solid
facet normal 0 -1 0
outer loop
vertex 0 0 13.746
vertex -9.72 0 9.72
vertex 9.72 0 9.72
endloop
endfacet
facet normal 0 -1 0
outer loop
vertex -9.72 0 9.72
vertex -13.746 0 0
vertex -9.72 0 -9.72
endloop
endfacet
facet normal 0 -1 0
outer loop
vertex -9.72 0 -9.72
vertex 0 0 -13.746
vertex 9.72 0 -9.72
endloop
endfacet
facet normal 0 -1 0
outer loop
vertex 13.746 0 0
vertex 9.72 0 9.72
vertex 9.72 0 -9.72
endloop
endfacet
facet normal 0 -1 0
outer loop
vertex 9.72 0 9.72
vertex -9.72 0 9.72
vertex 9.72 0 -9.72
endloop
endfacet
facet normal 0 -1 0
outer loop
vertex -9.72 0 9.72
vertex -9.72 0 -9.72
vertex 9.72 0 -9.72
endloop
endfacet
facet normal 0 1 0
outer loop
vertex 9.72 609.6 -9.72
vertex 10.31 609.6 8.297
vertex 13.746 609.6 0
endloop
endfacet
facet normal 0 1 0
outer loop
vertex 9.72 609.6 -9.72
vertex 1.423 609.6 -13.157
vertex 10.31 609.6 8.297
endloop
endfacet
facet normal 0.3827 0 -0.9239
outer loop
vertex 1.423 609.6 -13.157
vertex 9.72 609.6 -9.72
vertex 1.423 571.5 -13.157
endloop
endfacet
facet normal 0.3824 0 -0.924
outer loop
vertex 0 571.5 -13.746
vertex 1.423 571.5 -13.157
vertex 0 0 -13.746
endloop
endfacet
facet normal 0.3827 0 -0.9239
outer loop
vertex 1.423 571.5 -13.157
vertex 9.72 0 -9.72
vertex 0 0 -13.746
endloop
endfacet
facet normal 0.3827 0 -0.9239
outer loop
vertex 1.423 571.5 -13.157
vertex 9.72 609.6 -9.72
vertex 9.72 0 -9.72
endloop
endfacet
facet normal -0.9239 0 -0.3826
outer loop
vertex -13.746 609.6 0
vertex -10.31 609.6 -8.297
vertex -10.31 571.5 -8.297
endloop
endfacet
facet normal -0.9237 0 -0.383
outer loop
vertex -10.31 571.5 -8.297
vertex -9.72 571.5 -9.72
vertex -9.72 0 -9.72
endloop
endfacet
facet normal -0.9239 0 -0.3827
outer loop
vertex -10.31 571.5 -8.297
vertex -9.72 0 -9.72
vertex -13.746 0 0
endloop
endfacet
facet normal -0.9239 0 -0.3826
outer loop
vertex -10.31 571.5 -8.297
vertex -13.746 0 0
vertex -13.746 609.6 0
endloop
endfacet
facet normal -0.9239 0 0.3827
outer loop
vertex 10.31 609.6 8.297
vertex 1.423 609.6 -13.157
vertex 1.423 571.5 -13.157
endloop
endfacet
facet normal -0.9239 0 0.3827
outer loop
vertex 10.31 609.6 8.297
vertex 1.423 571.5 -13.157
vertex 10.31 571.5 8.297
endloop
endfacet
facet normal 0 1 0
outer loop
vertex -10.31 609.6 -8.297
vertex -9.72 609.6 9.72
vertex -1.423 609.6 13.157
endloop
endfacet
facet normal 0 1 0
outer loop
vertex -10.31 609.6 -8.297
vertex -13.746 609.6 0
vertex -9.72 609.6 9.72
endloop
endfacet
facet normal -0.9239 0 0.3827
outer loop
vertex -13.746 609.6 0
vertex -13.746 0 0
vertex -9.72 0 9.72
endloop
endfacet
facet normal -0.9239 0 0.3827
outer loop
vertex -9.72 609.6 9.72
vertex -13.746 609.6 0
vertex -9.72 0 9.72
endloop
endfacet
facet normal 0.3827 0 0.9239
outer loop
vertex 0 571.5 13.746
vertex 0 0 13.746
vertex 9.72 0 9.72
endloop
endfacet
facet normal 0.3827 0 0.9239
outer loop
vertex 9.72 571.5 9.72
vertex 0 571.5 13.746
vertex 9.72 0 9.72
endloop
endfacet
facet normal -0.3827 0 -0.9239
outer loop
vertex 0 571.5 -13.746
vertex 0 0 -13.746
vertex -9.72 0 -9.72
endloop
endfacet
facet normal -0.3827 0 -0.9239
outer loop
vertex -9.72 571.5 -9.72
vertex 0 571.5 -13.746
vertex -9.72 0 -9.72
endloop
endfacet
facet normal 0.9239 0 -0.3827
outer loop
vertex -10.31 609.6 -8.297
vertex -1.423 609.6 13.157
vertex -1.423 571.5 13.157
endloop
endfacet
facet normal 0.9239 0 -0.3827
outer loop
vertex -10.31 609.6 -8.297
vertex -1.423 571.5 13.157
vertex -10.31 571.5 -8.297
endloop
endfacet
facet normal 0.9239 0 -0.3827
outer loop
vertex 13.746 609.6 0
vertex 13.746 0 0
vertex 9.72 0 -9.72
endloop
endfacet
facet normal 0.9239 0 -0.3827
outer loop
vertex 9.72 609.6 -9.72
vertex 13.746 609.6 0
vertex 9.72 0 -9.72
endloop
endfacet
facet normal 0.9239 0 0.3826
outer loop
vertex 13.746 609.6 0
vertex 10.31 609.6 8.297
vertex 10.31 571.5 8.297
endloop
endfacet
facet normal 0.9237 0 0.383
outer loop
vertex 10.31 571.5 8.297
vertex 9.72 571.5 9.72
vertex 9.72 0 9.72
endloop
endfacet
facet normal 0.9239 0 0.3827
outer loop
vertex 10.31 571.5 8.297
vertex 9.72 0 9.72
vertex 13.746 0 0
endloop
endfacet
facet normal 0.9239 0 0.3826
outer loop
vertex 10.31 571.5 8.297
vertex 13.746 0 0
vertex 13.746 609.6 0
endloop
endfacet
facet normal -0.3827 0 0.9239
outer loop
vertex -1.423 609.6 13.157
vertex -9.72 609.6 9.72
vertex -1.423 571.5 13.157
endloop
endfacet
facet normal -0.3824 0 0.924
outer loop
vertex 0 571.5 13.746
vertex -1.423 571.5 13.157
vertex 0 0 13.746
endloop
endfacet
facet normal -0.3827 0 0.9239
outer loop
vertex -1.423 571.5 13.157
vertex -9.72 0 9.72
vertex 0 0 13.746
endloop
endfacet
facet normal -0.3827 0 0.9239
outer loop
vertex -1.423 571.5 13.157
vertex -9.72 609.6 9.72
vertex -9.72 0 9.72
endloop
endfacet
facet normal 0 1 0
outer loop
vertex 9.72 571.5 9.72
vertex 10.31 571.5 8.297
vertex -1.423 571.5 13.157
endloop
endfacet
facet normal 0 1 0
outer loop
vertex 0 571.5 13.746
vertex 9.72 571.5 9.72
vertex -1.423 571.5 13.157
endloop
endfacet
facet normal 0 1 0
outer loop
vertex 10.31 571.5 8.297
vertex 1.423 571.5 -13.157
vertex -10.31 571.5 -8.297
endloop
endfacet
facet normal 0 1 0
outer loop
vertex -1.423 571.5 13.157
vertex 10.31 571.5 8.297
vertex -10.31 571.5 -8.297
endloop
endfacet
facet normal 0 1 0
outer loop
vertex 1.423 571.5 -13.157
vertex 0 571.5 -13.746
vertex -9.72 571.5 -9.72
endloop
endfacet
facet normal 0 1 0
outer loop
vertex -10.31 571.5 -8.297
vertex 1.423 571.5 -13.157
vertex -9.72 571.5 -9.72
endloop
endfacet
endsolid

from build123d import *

# Parameters (mm, degrees)
BOSS_EXTRUDE1_DEPTH = 609.6
CUT_EXTRUDE1_DEPTH  = 38.1


with BuildPart() as part:
    # Sketch1 → Boss-Extrude1 (new body)
    with BuildSketch(Plane(origin=(0, 0, 0), x_dir=(1, 0, 0), z_dir=(0, 1, 0))):
        Polygon((13.746380944, 0), (9.720159182, 9.720159182), (0, 13.746380944), (-9.720159182, 9.720159182), (-13.746380944, 0), (-9.720159182, -9.720159182), (0, -13.746380944), (9.720159182, -9.720159182), align=None)
    extrude(amount=BOSS_EXTRUDE1_DEPTH)

    # Sketch2 → Cut-Extrude1 (cut)
    with BuildSketch(Plane(origin=(0, 609.6, 0), x_dir=(1, 0, 0), z_dir=(0, 1, 0))):
        Polygon((-1.00655544, -14.163309858), (-10.726714622, 9.303230267), (1.00655544, 14.163309858), (10.726714622, -9.303230267), align=None)
    extrude(amount=-CUT_EXTRUDE1_DEPTH, mode=Mode.SUBTRACT)


solid = part.part
